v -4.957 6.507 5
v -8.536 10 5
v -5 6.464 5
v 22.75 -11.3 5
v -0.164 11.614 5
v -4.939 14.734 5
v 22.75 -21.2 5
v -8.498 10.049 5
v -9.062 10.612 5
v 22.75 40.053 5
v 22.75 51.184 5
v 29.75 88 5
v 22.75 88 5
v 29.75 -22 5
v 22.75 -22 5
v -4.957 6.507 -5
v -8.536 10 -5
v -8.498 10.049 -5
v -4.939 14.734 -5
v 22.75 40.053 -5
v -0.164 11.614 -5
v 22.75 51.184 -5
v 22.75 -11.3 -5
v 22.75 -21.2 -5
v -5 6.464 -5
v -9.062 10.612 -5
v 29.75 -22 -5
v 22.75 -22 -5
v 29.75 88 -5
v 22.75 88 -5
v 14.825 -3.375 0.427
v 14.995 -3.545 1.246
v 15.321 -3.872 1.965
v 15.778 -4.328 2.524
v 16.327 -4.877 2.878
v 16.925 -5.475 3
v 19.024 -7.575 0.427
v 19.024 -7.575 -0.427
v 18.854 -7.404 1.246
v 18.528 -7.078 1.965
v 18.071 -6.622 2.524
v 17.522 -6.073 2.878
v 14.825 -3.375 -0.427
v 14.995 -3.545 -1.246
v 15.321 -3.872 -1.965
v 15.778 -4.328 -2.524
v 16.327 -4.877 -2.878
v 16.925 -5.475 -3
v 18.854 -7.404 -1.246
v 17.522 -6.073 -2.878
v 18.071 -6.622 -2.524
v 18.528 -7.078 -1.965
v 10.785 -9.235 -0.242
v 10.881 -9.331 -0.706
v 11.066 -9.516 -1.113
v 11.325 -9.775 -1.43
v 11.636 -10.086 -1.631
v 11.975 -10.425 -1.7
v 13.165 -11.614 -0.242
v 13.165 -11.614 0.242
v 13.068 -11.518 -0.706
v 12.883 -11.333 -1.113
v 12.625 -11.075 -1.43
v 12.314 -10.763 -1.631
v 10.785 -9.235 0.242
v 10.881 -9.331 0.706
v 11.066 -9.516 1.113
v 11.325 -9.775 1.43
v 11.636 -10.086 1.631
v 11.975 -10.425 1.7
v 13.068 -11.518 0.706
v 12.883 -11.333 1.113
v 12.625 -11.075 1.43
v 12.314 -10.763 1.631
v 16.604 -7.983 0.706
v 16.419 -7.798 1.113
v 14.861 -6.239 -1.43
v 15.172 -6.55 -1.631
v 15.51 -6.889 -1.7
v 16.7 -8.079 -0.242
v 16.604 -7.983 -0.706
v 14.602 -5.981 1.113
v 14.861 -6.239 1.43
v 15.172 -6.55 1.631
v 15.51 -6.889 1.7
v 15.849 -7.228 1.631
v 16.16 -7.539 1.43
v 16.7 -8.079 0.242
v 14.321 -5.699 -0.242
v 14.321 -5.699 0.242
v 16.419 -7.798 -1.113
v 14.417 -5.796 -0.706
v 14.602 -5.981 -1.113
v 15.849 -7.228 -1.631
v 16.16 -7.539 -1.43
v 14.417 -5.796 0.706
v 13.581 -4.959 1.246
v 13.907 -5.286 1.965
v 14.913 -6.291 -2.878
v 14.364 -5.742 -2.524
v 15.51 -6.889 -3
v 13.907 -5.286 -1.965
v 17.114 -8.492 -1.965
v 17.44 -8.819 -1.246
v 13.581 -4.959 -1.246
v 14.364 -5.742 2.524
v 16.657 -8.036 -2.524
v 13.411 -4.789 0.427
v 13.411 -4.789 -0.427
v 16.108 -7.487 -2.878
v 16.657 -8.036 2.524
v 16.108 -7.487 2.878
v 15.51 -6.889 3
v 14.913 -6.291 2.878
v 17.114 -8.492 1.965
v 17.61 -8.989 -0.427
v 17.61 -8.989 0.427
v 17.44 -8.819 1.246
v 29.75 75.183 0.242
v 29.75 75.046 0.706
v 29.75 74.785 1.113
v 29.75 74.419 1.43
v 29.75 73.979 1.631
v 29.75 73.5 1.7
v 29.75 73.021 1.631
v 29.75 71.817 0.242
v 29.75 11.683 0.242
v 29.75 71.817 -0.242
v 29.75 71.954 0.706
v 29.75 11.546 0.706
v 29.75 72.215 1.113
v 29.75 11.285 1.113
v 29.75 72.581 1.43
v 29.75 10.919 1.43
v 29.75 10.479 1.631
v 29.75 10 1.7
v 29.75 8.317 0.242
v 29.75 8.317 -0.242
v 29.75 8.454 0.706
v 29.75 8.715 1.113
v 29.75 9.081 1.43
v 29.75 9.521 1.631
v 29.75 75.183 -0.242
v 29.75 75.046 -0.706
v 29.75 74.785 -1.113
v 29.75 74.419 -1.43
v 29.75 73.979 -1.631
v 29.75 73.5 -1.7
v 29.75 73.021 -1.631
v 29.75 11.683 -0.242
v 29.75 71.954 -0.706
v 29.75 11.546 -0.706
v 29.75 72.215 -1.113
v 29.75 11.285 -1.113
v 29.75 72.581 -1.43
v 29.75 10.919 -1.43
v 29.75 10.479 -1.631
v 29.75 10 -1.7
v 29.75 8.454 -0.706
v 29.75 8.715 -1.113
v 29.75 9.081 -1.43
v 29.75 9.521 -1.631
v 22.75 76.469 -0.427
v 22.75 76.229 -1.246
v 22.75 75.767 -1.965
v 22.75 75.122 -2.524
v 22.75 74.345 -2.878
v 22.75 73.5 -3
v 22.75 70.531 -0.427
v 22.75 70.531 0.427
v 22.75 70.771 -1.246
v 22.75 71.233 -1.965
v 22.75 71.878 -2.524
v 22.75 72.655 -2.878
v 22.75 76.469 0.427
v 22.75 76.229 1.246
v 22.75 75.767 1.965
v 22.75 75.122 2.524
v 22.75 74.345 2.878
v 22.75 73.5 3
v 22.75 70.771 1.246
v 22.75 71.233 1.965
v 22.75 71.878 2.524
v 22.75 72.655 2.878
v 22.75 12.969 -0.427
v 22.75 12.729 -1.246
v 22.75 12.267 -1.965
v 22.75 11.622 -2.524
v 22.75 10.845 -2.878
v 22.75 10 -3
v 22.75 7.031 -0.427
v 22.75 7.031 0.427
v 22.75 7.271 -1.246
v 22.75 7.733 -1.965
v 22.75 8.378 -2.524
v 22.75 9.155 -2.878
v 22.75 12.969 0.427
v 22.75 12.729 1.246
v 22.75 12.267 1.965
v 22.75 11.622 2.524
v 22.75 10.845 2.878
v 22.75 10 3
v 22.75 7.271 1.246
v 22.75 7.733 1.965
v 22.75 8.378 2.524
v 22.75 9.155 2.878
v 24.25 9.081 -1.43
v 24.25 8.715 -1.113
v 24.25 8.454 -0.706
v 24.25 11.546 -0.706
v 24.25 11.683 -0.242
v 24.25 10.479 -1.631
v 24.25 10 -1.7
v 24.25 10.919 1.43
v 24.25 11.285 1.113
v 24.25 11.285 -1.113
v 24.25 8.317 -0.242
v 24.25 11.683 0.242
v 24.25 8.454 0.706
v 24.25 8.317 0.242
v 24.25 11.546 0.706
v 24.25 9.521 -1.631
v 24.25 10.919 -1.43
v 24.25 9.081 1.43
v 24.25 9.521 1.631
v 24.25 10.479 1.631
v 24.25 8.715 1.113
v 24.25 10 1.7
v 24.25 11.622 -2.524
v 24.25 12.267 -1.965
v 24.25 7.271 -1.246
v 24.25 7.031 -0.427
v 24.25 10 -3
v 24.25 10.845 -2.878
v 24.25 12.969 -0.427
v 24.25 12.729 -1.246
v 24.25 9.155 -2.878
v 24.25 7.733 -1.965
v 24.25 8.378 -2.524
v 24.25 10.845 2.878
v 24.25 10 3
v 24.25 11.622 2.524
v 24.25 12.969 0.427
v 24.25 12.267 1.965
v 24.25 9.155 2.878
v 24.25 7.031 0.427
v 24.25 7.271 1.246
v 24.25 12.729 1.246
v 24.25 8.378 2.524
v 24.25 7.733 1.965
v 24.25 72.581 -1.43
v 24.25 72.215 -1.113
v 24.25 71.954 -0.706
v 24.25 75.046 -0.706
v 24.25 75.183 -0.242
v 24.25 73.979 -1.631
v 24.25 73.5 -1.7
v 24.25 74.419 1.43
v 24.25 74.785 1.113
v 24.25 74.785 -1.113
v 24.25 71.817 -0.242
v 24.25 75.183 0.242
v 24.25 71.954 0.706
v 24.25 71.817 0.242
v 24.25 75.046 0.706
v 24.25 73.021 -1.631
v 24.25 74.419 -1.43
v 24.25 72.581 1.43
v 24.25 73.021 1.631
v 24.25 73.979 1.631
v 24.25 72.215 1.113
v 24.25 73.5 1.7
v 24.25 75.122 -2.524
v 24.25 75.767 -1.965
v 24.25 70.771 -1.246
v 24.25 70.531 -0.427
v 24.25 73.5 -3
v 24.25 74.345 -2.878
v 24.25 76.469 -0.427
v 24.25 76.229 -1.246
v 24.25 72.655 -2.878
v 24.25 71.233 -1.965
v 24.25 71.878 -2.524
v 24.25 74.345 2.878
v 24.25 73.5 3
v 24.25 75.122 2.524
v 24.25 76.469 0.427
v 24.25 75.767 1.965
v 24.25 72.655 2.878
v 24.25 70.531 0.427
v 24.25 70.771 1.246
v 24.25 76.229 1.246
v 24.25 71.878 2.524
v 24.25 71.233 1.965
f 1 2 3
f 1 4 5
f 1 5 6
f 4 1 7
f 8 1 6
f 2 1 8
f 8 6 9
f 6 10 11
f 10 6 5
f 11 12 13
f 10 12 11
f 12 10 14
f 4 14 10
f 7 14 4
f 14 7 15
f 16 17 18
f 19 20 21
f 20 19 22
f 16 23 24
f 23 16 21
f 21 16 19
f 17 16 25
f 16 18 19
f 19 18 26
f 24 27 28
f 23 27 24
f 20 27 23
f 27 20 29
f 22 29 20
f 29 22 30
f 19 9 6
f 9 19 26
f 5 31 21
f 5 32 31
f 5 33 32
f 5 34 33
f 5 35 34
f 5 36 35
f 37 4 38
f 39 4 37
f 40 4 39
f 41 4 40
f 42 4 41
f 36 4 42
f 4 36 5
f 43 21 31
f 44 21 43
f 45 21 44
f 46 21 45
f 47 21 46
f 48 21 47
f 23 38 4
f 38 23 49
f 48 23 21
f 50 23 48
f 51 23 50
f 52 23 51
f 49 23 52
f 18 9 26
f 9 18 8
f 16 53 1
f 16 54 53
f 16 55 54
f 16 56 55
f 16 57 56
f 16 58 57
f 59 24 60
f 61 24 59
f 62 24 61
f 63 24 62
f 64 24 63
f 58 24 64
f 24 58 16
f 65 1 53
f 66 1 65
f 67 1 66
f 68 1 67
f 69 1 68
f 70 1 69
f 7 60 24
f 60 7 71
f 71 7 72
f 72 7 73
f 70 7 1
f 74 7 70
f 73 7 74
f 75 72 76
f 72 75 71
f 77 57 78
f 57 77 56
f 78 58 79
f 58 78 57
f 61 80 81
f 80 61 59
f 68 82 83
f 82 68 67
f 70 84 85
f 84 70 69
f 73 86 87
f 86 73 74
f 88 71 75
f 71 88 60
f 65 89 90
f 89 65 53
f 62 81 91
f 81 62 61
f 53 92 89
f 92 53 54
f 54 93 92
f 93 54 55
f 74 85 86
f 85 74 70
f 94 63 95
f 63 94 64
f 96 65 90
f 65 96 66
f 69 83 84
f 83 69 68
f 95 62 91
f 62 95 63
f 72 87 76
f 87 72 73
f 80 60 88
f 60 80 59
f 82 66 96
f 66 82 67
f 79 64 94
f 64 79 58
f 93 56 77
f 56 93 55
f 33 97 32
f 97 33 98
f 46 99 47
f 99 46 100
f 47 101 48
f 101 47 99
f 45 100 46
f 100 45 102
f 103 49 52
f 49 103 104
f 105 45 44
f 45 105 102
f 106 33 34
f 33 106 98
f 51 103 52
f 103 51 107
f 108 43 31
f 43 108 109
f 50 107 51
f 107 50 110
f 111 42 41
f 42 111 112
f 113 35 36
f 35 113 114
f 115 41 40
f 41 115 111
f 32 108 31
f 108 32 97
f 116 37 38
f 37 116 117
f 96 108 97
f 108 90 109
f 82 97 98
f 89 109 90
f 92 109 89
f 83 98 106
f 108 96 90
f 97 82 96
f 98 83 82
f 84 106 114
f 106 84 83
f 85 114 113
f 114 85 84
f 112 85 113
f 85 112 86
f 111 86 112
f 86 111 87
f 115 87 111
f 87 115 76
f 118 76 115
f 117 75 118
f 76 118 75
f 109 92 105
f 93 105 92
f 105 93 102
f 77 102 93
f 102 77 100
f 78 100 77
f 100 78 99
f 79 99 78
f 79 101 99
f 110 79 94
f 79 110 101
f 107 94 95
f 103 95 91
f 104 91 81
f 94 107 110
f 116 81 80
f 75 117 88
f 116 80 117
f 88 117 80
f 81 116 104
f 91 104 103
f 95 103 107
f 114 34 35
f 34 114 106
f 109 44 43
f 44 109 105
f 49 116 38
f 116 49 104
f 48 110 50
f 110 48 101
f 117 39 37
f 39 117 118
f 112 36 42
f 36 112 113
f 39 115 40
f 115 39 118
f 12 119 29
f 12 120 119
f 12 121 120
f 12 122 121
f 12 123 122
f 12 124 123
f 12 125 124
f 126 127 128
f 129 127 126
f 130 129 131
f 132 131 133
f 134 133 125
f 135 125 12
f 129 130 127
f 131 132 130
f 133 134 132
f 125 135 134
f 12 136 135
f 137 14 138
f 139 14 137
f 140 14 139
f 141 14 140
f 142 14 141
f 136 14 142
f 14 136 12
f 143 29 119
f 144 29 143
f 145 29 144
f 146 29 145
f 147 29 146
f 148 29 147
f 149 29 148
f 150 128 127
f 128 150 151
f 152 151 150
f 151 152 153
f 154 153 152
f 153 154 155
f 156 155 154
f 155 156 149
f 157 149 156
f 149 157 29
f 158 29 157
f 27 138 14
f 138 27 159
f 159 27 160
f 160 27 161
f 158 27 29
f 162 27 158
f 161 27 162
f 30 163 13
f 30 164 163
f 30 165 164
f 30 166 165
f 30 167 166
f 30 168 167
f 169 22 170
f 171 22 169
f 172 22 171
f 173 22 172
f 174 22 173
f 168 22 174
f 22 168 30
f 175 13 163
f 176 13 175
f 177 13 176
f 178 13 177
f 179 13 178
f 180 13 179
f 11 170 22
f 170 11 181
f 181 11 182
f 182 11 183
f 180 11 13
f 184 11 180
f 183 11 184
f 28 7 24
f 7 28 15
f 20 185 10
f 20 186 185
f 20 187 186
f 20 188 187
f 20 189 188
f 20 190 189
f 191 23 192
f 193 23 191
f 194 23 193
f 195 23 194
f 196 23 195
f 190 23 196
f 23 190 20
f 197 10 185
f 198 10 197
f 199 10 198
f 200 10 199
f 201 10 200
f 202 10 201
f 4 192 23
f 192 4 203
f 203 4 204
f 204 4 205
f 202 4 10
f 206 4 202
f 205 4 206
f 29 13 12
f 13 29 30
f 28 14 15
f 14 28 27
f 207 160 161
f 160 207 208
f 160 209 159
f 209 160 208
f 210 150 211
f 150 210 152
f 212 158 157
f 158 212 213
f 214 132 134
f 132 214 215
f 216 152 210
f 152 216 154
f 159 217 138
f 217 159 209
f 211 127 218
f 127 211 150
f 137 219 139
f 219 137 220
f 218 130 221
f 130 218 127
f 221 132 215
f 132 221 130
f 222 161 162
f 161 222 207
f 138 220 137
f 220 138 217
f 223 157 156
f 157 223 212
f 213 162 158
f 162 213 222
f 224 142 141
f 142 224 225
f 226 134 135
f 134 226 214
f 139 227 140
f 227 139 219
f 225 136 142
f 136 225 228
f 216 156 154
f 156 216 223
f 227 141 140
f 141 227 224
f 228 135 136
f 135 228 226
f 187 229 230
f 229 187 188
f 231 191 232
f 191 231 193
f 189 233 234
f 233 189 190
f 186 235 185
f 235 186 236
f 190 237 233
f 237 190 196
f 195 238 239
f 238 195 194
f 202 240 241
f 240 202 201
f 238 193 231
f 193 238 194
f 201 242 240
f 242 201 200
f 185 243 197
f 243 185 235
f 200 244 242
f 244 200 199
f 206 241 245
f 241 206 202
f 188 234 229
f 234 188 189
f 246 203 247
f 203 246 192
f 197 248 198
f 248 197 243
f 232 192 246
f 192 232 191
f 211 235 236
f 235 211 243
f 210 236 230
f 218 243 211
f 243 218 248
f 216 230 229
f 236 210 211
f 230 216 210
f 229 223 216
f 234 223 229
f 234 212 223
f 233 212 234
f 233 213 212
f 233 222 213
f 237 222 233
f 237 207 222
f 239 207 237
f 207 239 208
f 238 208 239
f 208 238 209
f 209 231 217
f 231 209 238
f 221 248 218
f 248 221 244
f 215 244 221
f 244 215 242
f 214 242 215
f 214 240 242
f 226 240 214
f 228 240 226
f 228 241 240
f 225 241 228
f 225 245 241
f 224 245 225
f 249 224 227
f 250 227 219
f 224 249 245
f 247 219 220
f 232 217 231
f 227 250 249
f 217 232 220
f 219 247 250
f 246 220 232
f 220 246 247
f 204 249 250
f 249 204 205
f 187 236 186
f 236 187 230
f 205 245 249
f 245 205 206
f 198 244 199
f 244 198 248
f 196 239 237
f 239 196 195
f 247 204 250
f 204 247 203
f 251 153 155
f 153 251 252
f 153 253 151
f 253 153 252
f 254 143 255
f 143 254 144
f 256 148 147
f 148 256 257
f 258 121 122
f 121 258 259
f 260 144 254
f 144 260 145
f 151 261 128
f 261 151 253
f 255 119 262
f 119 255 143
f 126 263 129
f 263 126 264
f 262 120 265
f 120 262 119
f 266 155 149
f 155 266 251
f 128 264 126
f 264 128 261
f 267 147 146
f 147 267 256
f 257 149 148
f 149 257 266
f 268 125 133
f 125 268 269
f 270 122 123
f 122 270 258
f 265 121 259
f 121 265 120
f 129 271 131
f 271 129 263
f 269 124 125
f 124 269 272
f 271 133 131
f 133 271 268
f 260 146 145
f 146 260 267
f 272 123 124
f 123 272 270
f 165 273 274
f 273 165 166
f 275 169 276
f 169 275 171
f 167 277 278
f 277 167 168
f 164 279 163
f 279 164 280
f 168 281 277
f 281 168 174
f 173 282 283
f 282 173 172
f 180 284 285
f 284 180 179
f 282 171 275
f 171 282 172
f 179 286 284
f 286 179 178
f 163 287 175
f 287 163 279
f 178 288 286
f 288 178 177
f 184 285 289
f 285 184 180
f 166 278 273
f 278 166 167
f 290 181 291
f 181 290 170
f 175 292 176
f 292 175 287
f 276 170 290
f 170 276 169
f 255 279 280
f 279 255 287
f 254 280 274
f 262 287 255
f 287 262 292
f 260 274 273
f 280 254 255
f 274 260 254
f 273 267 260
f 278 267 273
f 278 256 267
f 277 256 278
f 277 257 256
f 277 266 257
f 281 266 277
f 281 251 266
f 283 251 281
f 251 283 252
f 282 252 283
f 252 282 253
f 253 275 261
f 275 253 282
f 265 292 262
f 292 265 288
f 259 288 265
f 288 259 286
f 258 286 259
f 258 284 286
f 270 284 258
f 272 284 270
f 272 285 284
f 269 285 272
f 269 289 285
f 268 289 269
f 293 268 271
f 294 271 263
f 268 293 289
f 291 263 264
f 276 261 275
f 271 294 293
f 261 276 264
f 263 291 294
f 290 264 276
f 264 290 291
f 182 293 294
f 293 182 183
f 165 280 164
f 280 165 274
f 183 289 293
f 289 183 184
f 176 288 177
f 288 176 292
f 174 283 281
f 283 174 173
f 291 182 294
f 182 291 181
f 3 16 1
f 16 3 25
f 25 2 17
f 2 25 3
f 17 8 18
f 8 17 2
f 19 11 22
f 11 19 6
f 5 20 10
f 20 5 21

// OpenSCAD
//======================================================================
// mmu_frame_holder.scad
//
// frame() is the original setup for Prusa Mk3
// frame2() is the setup with Core One
//
// DrTomFlint 28 July 2024, updated 12 Aug 2025
//
//======================================================================


thick=10;
wide=7;

x1=45.5;  // first bar
x2=5;   // left foot
x3=10;  // right foot

F1=99;
F2=33;

//----------------------------------------------------------------------
module frame(){

  // first bar
  cube([x1,wide,thick],center=true);
  
  // left foot
  translate([-x1/2,-4.5,0])  
  cube([x2,16,thick],center=true);
  translate([-x1/2+2.5,-4.5-7.2,0])  
  cylinder(r=1,h=thick,$fn=6,center=true);

  // right foot
  translate([x1/2,-4.5,0])  
  cube([x2,16,thick],center=true);
  translate([x1/2-2.5,-4.5-8,0])  
  rotate([0,0,5])
  cube([10,5,thick],center=true);

  // mmu bar
  rotate([0,0,8])
  difference(){
    translate([x1/2+3.5,-18+100/2,0])  
    cube([wide,100,thick],center=true);
    
    // bore
    translate([x1/2,10,0])  
    rotate([0,90,0])
    cylinder(r=1.7,h=3*thick,$fn=22,center=true);
    // countersink
    translate([x1/2,10,0])  
    rotate([0,90,0])
    cylinder(r=3,h=3,$fn=22,center=true);
  
    // bore
    translate([x1/2,10+63.5,0])  
    rotate([0,90,0])
    cylinder(r=1.7,h=3*thick,$fn=22,center=true);
    // countersink
    translate([x1/2,10+63.5,0])  
    rotate([0,90,0])
    cylinder(r=3,h=3,$fn=22,center=true);
  }

  // brace bar
  hull(){
    translate([-x1/2+2,0,0])  
    cube([5,5,thick],center=true);
    
    rotate([0,0,8])
    translate([x1/2+3.5,50,0]) cube([5,5,thick],center=true);
  }
  
}

//----------------------------------------------------------------------
module frame2(){

  // first bar
  translate([9.5,-3,0])  
  rotate([0,0,-45])
  difference(){
    cube([x1,wide,thick],center=true);
    // bore
    translate([7,10,0])  
    rotate([0,0,90])
    rotate([0,90,0])
    cylinder(r=1.7,h=6*thick,$fn=22,center=true);
    // countersink
    translate([7,3,0])  
    rotate([0,0,90])
    rotate([0,90,0])
    cylinder(r=3,h=3,$fn=22,center=true);
  }
  
  // mmu bar
  difference(){
    translate([x1/2+3.5,-22+110/2,0])  
    cube([wide,110,thick],center=true);
    
    // bore
    translate([x1/2,10,0])  
    rotate([0,90,0])
    cylinder(r=1.7,h=3*thick,$fn=22,center=true);
    // countersink
    translate([x1/2,10,0])  
    rotate([0,90,0])
    cylinder(r=3,h=3,$fn=22,center=true);
  
    // bore
    translate([x1/2,10+63.5,0])  
    rotate([0,90,0])
    cylinder(r=1.7,h=3*thick,$fn=22,center=true);
    // countersink
    translate([x1/2,10+63.5,0])  
    rotate([0,90,0])
    cylinder(r=3,h=3,$fn=22,center=true);
  }

  // brace bar
  hull(){
    translate([-5,10,0])  
    rotate([0,0,45])
    cube([5,5,thick],center=true);
    
    rotate([0,0,0])
    translate([x1/2+3.5,50,0]) 
    cube([5,5,thick],center=true);
  }
  
}


//======================================================================

//~ frame();
frame2();

//~ color("red")
//~ translate([0,-7,0])
//~ cube([40,6.5,10],center=true);

//======================================================================
